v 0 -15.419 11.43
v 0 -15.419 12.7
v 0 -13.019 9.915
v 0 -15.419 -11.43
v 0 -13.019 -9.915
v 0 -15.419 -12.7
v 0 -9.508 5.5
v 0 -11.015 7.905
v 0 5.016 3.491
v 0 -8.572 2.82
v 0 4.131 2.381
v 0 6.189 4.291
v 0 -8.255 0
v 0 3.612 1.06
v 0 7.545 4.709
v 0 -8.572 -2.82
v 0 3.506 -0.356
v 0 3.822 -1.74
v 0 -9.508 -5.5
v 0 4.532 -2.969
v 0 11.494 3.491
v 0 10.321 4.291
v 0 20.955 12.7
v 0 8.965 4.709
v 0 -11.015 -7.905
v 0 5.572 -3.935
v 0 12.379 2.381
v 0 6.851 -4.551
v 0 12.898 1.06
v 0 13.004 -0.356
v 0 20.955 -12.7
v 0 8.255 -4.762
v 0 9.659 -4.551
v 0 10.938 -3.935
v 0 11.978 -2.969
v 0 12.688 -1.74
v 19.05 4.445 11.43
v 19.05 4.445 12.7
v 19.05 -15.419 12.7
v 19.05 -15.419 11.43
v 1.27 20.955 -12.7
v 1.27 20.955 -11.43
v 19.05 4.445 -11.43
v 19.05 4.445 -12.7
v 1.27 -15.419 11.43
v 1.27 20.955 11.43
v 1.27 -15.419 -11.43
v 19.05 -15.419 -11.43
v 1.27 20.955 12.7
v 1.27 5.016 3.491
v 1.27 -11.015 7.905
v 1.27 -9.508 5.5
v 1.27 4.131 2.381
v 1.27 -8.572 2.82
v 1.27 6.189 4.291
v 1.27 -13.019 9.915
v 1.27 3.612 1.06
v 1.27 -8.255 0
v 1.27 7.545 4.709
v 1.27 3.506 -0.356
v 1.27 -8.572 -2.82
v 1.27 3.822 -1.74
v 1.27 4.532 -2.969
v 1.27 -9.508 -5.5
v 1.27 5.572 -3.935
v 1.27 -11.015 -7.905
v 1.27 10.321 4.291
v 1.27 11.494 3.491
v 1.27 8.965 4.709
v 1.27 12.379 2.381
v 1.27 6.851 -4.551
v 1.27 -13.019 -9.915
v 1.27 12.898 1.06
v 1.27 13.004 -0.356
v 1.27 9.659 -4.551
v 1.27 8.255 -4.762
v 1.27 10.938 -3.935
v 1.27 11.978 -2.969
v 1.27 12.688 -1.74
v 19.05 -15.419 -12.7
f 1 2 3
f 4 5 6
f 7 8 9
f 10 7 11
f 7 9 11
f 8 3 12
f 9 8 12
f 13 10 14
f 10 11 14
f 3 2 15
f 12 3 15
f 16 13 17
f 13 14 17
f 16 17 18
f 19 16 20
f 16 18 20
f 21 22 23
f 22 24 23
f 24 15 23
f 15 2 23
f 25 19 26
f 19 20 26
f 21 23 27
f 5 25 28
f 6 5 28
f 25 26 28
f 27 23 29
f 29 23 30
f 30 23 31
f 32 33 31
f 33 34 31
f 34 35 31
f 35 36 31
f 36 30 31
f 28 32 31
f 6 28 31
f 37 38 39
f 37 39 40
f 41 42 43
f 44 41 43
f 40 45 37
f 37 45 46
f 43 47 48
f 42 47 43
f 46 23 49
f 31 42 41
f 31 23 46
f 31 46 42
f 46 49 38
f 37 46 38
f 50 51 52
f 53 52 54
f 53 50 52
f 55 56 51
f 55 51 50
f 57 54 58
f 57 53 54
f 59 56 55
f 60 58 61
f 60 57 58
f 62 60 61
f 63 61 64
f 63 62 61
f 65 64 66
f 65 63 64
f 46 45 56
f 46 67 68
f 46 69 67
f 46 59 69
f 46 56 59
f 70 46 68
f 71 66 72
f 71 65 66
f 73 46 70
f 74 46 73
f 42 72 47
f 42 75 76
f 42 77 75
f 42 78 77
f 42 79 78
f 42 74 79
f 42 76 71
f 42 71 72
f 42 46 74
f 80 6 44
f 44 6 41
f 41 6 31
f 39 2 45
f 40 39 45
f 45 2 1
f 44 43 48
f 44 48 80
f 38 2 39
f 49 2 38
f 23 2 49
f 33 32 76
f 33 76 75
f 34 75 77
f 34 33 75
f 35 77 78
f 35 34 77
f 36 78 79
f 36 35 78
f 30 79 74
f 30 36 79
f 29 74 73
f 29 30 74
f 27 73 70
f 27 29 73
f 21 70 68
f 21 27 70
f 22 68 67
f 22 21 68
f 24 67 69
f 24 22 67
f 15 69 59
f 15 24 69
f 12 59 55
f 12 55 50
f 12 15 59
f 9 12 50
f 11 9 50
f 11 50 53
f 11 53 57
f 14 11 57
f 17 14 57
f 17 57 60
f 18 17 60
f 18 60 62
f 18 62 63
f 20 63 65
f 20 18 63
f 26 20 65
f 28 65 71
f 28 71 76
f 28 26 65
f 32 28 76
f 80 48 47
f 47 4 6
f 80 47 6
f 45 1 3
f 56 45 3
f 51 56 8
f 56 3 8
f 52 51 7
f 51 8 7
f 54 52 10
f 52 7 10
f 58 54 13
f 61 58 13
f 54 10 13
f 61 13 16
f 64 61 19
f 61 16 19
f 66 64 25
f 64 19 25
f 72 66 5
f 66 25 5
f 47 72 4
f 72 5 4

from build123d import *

# Parameters (mm, degrees)
SKETCH1_R           = 4.7625
BOSS_EXTRUDE1_DEPTH = 1.27
SKETCH1_3_W         = 1.27
SKETCH1_3_H         = 36.374198342
BOSS_EXTRUDE2_DEPTH = 19.05
CUT_EXTRUDE1_DEPTH  = 33.02


with BuildPart() as part:
    # Sketch1 → Boss-Extrude1 (new body)
    with BuildSketch(Plane(origin=(0, 0, 0), x_dir=(0, 0, -1), z_dir=(1, 0, 0))):
        with BuildLine():
            Line((11.43, 20.955), (-11.43, 20.955))
            Line((-11.43, 20.955), (-11.43, -15.419198342))
            ThreePointArc((-11.43, -15.419198342), (0, -8.255), (11.43, -15.419198342))
            Line((11.43, -15.419198342), (11.43, 20.955))
        make_face()
        with Locations((0, 8.255)):
            Circle(SKETCH1_R, mode=Mode.SUBTRACT)
    extrude(amount=BOSS_EXTRUDE1_DEPTH)

    # Sketch1<3> → Boss-Extrude2 (add)
    with BuildSketch(Plane(origin=(0, 0, 0), x_dir=(0, 0, -1), z_dir=(1, 0, 0))):
        with Locations((-12.065, 2.767900829)):
            Rectangle(SKETCH1_3_W, SKETCH1_3_H)
        with Locations((12.065, 2.767900829)):
            Rectangle(SKETCH1_3_W, SKETCH1_3_H)
    extrude(amount=BOSS_EXTRUDE2_DEPTH)

    # Sketch2 → Cut-Extrude1 (cut)
    with BuildSketch(Plane.XY.offset(12.7)):
        Polygon((1.27, 20.955), (19.05, 4.445), (19.05, 20.955), align=None)
    extrude(amount=-CUT_EXTRUDE1_DEPTH, mode=Mode.SUBTRACT)


solid = part.part
